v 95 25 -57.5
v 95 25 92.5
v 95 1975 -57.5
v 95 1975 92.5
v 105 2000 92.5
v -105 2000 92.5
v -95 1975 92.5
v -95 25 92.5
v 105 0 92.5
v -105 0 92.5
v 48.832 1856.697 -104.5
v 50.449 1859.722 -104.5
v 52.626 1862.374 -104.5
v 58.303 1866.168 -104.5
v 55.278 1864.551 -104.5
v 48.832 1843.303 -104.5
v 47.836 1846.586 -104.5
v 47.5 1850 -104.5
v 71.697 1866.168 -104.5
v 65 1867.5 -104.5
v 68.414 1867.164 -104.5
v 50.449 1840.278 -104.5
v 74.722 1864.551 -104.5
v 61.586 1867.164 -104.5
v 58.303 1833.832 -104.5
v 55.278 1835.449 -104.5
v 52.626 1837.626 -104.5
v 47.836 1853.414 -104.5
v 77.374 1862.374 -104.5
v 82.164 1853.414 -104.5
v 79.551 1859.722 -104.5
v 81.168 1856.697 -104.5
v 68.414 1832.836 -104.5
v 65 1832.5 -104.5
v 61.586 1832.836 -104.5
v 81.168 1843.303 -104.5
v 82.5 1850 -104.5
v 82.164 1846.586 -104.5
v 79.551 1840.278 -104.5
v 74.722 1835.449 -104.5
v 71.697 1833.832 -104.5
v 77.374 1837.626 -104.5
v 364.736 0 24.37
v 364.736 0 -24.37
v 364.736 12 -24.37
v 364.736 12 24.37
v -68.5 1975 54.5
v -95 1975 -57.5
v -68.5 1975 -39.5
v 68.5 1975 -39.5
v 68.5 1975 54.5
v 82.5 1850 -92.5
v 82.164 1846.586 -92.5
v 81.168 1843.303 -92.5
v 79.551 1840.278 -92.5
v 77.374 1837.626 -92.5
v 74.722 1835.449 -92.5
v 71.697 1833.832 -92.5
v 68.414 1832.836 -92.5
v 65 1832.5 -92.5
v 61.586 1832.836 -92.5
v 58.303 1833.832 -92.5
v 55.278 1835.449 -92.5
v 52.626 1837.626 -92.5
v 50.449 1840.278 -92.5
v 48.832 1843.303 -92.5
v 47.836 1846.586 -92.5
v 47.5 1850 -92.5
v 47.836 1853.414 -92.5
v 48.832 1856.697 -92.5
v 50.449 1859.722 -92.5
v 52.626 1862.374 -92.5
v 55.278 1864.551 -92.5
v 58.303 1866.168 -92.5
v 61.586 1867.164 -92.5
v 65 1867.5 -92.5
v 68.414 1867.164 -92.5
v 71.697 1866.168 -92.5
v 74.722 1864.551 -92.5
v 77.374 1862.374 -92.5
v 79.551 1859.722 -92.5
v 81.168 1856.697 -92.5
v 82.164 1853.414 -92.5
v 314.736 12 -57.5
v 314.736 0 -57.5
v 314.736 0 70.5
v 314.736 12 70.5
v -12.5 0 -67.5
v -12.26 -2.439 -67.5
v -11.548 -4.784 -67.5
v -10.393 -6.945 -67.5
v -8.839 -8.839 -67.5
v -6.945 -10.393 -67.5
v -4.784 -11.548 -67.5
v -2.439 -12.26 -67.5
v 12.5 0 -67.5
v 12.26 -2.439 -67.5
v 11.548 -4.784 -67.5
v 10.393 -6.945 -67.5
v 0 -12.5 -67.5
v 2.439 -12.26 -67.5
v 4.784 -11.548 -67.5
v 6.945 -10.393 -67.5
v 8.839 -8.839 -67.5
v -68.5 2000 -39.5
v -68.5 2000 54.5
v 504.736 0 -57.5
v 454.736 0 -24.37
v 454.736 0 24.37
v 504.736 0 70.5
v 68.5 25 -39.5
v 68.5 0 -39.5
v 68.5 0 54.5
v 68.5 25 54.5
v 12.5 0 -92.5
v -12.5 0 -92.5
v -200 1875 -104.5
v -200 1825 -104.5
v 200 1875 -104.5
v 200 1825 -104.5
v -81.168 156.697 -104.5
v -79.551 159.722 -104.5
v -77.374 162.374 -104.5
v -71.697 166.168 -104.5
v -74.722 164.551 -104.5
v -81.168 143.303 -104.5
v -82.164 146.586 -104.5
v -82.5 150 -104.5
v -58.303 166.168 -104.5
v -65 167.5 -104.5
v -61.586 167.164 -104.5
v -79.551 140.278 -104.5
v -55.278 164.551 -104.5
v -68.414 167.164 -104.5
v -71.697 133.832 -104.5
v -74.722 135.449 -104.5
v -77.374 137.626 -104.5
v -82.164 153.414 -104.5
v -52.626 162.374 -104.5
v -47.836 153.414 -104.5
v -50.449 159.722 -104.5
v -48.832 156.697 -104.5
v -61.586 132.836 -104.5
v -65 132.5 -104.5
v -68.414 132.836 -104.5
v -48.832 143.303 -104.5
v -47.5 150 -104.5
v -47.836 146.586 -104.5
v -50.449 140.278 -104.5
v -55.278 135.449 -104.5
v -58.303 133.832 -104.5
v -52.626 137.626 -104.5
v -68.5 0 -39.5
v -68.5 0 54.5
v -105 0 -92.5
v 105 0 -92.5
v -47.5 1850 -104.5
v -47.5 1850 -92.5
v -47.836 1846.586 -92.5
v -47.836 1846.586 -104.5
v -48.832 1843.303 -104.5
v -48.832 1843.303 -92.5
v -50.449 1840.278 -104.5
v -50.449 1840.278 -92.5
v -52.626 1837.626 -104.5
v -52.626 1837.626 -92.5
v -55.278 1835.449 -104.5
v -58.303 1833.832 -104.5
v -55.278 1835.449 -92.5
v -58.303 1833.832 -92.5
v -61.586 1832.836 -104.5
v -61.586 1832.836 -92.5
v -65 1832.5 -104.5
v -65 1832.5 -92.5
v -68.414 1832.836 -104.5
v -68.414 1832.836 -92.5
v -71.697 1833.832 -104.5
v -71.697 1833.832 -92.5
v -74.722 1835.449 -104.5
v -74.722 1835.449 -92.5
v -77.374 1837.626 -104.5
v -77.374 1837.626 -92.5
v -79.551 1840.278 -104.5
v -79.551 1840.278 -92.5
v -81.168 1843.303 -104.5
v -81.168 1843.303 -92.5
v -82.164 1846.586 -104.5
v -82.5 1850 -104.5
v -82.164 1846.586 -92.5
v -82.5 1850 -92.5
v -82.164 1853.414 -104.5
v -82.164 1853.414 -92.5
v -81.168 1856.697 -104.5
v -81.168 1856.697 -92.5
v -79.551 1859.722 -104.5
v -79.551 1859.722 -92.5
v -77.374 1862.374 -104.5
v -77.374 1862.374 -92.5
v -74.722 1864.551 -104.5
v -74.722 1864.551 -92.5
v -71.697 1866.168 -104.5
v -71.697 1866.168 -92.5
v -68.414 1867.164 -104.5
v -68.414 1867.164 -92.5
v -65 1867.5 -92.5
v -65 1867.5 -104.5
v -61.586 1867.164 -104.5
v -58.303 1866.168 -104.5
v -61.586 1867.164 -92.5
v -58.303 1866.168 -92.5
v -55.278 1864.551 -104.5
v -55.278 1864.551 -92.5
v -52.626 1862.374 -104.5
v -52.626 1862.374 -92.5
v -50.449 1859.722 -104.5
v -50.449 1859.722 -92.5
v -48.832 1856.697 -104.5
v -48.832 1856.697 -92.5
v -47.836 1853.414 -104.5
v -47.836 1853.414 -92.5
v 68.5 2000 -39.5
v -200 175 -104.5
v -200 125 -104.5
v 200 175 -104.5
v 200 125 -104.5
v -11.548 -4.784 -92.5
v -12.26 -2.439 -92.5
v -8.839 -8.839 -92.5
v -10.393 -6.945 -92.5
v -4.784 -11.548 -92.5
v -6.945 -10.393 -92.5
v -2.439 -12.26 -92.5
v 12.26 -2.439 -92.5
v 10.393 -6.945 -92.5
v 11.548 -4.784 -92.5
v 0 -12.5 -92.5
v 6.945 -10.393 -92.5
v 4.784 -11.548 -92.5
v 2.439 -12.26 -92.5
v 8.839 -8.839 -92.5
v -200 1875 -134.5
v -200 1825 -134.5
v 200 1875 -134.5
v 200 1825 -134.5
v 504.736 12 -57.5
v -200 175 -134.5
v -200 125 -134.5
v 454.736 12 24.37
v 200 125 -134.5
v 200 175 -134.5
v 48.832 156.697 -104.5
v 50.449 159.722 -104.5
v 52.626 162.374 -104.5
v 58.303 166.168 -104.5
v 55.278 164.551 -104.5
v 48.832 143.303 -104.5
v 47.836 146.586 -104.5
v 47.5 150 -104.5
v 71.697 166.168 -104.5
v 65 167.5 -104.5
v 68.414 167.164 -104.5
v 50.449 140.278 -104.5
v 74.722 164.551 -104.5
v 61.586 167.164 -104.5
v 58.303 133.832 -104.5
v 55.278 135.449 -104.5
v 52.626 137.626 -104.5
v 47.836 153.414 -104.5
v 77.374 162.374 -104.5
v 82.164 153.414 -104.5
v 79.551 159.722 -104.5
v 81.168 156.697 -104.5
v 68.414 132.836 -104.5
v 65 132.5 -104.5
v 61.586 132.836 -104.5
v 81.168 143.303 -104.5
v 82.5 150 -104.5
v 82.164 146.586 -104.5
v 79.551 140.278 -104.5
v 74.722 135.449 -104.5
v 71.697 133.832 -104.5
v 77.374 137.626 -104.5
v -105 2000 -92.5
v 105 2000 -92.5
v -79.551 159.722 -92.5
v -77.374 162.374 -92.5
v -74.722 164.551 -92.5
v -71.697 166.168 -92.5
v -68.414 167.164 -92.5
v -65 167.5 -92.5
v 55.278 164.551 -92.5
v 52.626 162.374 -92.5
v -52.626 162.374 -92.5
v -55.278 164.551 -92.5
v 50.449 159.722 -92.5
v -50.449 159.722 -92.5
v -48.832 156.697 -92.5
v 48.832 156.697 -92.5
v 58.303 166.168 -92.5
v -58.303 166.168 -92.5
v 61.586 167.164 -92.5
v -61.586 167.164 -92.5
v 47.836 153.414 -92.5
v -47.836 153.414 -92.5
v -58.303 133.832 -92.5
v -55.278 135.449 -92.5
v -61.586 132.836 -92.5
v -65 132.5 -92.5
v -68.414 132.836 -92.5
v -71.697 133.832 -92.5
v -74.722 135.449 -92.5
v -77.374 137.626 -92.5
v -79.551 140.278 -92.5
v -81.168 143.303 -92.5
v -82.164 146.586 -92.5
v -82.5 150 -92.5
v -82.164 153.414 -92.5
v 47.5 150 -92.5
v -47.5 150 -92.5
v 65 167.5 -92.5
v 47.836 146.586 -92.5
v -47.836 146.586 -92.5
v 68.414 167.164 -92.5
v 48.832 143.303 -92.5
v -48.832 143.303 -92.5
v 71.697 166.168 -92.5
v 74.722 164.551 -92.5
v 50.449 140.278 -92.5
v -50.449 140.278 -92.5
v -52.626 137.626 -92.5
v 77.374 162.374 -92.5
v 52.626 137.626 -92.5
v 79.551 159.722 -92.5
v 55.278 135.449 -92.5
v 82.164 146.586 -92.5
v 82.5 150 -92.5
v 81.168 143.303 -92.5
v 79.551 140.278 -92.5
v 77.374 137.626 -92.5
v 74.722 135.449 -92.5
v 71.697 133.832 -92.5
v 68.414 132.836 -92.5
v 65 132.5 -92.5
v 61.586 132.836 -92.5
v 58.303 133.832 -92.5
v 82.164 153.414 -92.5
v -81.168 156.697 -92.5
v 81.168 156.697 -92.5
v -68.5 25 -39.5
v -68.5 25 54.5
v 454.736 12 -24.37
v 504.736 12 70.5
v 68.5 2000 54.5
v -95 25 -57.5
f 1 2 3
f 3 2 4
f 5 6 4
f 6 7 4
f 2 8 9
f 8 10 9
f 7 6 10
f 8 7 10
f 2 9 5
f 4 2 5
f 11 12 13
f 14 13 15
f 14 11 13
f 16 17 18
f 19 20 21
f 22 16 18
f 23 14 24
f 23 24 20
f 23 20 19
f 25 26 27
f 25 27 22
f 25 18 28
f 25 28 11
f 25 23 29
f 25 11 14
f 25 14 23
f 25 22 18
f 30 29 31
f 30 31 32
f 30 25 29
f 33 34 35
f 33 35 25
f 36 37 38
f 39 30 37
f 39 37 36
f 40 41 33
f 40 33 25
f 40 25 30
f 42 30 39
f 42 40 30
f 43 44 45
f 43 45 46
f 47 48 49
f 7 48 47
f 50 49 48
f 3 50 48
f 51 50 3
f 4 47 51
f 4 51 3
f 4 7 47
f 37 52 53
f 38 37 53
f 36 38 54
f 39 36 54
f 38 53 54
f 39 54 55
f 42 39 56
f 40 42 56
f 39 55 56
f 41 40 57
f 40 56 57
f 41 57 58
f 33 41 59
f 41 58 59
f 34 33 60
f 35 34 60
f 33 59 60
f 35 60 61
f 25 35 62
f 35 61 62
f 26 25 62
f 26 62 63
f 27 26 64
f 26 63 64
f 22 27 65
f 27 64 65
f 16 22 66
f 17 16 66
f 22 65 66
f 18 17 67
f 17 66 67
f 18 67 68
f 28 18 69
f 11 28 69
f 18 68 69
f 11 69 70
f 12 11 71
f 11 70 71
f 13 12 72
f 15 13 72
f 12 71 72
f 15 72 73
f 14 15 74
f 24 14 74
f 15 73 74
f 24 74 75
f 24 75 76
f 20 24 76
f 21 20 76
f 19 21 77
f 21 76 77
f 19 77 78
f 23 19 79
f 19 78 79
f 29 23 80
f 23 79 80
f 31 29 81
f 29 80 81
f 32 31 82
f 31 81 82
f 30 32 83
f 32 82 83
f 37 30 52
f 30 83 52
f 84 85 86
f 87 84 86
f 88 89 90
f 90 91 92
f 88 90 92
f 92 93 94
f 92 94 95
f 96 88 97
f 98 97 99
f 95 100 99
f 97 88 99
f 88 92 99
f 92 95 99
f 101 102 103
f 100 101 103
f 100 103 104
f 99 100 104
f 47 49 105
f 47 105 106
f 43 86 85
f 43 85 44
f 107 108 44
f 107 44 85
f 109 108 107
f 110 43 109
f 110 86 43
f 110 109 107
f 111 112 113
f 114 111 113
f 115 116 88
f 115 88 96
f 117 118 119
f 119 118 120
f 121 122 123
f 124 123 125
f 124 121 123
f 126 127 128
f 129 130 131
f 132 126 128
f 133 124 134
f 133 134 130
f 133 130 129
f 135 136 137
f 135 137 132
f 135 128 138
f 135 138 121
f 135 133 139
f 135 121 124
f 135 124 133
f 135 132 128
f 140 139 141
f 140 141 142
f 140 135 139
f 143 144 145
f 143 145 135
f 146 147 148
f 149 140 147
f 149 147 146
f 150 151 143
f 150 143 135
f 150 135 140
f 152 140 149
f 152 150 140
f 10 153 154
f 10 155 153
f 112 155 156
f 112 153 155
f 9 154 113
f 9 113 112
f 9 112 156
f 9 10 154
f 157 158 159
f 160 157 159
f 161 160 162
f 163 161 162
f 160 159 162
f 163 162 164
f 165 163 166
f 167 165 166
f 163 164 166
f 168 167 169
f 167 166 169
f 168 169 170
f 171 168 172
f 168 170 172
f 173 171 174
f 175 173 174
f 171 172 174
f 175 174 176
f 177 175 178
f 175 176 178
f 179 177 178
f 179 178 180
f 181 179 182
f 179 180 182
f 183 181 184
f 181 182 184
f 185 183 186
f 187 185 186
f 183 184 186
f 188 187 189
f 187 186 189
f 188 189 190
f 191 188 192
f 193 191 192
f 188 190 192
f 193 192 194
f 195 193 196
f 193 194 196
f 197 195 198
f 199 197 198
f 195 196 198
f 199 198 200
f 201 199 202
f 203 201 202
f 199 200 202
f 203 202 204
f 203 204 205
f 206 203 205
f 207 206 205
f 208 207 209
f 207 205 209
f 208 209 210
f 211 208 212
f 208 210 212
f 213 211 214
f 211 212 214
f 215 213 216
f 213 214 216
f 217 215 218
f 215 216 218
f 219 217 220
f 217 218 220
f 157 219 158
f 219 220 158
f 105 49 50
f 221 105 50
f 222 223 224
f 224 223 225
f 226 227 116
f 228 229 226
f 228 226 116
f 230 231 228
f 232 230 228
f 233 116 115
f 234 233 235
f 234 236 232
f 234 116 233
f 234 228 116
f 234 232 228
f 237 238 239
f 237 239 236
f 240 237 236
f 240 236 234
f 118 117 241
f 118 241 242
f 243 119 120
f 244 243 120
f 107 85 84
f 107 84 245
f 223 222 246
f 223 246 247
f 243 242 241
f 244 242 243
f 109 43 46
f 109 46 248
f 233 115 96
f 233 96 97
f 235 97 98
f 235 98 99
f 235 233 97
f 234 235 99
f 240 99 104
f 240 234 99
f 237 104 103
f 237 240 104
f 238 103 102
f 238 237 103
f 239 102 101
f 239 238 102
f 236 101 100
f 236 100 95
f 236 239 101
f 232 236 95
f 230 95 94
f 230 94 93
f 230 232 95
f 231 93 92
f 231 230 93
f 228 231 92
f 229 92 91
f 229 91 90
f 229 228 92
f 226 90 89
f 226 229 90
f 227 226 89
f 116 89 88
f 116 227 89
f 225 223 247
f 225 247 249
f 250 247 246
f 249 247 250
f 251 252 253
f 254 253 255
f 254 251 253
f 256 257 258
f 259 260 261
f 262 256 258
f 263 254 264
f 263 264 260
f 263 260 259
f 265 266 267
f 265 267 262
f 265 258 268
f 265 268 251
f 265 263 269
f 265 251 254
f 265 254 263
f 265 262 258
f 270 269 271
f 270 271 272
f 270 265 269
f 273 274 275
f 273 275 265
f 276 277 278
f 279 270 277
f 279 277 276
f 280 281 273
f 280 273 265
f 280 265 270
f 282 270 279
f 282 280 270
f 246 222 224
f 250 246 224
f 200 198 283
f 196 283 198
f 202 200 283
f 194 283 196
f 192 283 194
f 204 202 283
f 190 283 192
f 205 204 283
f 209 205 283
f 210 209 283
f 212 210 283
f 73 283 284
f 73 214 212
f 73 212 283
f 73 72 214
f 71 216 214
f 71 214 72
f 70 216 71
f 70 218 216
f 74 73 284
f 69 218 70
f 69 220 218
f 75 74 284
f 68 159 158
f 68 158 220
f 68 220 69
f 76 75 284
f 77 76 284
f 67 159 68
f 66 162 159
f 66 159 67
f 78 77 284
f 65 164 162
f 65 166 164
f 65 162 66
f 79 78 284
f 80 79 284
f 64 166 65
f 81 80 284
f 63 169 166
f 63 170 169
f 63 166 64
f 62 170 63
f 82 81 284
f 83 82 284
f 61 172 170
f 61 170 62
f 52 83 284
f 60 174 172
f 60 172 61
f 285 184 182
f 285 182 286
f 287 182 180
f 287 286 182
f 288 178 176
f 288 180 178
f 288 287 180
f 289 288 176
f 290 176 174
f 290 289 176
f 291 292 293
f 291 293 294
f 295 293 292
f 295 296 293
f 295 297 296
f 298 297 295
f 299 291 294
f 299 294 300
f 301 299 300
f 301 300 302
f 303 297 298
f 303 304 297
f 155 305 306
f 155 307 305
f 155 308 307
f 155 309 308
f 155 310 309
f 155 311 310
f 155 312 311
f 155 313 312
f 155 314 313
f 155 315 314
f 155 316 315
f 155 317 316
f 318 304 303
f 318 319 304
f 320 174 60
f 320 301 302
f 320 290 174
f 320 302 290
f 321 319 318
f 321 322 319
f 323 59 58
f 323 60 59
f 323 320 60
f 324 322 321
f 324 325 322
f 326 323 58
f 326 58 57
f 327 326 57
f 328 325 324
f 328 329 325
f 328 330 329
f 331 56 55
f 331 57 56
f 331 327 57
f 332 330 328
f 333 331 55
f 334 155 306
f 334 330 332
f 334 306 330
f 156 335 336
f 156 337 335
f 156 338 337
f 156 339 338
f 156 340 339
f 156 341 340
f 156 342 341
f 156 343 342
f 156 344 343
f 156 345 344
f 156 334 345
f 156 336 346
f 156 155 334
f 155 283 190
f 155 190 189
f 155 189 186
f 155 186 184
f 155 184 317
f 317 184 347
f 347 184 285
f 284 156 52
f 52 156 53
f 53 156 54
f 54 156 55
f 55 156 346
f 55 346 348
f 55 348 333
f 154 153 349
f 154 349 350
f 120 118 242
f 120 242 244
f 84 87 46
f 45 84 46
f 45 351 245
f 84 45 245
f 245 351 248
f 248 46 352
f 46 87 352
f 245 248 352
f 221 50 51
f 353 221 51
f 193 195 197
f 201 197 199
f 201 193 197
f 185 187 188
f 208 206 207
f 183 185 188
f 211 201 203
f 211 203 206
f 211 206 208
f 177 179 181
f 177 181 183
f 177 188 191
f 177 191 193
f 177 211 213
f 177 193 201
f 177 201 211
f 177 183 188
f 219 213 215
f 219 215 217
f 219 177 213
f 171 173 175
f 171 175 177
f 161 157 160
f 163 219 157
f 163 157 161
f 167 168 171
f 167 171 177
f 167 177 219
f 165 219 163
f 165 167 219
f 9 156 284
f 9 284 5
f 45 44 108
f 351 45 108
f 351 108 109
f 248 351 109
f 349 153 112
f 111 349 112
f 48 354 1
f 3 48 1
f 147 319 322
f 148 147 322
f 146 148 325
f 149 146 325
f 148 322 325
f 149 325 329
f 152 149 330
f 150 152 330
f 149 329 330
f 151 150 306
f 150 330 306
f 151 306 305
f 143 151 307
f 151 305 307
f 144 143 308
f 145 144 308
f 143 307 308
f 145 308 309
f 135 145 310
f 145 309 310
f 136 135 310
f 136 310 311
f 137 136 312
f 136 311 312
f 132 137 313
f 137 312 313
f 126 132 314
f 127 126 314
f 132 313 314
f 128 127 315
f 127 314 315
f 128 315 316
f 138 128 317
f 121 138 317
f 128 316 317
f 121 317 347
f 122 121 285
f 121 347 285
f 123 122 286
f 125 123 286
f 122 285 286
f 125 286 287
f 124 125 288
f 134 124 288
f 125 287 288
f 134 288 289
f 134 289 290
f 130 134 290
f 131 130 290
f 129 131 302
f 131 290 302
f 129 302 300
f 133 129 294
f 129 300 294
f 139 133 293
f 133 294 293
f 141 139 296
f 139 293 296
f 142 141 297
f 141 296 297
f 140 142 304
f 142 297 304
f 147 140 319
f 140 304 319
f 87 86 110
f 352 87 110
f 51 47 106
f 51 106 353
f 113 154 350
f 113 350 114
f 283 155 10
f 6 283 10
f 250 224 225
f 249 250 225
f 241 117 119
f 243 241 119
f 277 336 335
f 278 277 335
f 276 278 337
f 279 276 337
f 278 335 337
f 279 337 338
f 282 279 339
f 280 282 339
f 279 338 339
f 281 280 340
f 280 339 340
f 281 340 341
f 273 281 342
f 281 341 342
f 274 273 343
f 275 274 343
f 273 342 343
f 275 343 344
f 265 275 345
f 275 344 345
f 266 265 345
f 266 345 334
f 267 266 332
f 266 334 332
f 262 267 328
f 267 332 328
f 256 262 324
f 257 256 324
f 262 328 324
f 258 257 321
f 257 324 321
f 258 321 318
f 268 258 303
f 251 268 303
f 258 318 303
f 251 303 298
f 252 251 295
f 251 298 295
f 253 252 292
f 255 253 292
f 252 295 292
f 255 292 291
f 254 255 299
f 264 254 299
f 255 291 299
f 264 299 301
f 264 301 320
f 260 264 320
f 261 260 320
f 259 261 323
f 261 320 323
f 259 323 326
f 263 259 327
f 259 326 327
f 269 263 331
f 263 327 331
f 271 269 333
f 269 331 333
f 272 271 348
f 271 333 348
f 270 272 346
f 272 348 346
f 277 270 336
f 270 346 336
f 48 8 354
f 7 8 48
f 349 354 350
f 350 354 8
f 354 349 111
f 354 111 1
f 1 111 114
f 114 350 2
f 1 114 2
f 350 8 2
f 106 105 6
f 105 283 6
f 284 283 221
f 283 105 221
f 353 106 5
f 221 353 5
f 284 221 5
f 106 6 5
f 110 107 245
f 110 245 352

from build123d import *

# Parameters (mm, degrees)
F0_W      = 210
F0_H      = 185
F1_DEPTH  = 2000
F2_W      = 137
F2_H      = 94
F3_DEPTH  = 2100
F4_DEPTH  = 2100
F5_W      = 190
F5_H      = 1950
F6_DEPTH  = 150
F8_DEPTH  = 25
F9_R      = 17.5
F10_DEPTH = 12
F11_W     = 400
F11_H     = 50
F12_DEPTH = 30
F11_R     = 17.5
F13_W     = 190
F13_H     = 128
F13_W_2   = 90
F13_H_2   = 48.74
F14_DEPTH = 12


with BuildPart() as f1:
    # F0 (on Front) → F1 (new body)
    with BuildSketch(Plane.XZ):
        Rectangle(F0_W, F0_H)
    extrude(amount=-F1_DEPTH)

    # F2 (on face) → F3 (join)
    with BuildSketch(Plane.XZ):
        with Locations((0, 7.5)):
            Rectangle(F2_W, F2_H)
    extrude(amount=-F3_DEPTH)

    # F2 (on face) → F4 (cut)
    with BuildSketch(Plane.XZ):
        with Locations((0, 7.5)):
            Rectangle(F2_W, F2_H)
    extrude(amount=-F4_DEPTH, mode=Mode.SUBTRACT)

    # F5 (on face) → F6 (cut)
    with BuildSketch(Plane.XY.offset(92.5)):
        with Locations((0, 1000)):
            Rectangle(F5_W, F5_H)
    extrude(amount=-F6_DEPTH, mode=Mode.SUBTRACT)

    # F9 (on face) → F10 (join)
    with BuildSketch(Plane(origin=(0, 0, -92.5), x_dir=(1, 0, 0), z_dir=(0, 0, -1))):
        with Locations((65, -1850)):
            Circle(F9_R)
        with Locations((-65, -1850)):
            Circle(F9_R)
        with Locations((65, -150)):
            Circle(F9_R)
        with Locations((-65, -150)):
            Circle(F9_R)
    extrude(amount=F10_DEPTH)


with BuildPart() as f8:
    # F7 (on face) → F8 (new body)
    with BuildSketch(Plane(origin=(0, 0, -92.5), x_dir=(1, 0, 0), z_dir=(0, 0, -1))):
        with BuildLine():
            Line((-12.5, 0), (12.5, 0))
            ThreePointArc((12.5, 0), (0, 12.5), (-12.5, 0))
        make_face()
    extrude(amount=-F8_DEPTH)


with BuildPart() as f12:
    # F11 (on face) → F12 (new body)
    with BuildSketch(Plane(origin=(0, 0, -104.5), x_dir=(1, 0, 0), z_dir=(0, 0, -1))):
        with Locations((0, -1850)):
            Rectangle(F11_W, F11_H)
    extrude(amount=F12_DEPTH)


with BuildPart() as f12b:
    # F11 (on face) → F12, piece 2 (new body)
    with BuildSketch(Plane(origin=(0, 0, -104.5), x_dir=(1, 0, 0), z_dir=(0, 0, -1))):
        with Locations((0, -150)):
            Rectangle(F11_W, F11_H)
        with Locations((-65, -150)):
            Circle(F11_R, mode=Mode.SUBTRACT)
        with Locations((-65, -150)):
            Circle(F11_R)
    extrude(amount=F12_DEPTH)


with BuildPart() as f14:
    # F13 (on face) → F14 (new body)
    with BuildSketch(Plane.XZ):
        with Locations((409.7357392311, 6.5)):
            Rectangle(F13_W, F13_H)
        with Locations((409.7357392311, 0)):
            Rectangle(F13_W_2, F13_H_2, mode=Mode.SUBTRACT)
    extrude(amount=-F14_DEPTH)


solid = Compound([f1.part, f8.part, f12.part, f12b.part, f14.part])
